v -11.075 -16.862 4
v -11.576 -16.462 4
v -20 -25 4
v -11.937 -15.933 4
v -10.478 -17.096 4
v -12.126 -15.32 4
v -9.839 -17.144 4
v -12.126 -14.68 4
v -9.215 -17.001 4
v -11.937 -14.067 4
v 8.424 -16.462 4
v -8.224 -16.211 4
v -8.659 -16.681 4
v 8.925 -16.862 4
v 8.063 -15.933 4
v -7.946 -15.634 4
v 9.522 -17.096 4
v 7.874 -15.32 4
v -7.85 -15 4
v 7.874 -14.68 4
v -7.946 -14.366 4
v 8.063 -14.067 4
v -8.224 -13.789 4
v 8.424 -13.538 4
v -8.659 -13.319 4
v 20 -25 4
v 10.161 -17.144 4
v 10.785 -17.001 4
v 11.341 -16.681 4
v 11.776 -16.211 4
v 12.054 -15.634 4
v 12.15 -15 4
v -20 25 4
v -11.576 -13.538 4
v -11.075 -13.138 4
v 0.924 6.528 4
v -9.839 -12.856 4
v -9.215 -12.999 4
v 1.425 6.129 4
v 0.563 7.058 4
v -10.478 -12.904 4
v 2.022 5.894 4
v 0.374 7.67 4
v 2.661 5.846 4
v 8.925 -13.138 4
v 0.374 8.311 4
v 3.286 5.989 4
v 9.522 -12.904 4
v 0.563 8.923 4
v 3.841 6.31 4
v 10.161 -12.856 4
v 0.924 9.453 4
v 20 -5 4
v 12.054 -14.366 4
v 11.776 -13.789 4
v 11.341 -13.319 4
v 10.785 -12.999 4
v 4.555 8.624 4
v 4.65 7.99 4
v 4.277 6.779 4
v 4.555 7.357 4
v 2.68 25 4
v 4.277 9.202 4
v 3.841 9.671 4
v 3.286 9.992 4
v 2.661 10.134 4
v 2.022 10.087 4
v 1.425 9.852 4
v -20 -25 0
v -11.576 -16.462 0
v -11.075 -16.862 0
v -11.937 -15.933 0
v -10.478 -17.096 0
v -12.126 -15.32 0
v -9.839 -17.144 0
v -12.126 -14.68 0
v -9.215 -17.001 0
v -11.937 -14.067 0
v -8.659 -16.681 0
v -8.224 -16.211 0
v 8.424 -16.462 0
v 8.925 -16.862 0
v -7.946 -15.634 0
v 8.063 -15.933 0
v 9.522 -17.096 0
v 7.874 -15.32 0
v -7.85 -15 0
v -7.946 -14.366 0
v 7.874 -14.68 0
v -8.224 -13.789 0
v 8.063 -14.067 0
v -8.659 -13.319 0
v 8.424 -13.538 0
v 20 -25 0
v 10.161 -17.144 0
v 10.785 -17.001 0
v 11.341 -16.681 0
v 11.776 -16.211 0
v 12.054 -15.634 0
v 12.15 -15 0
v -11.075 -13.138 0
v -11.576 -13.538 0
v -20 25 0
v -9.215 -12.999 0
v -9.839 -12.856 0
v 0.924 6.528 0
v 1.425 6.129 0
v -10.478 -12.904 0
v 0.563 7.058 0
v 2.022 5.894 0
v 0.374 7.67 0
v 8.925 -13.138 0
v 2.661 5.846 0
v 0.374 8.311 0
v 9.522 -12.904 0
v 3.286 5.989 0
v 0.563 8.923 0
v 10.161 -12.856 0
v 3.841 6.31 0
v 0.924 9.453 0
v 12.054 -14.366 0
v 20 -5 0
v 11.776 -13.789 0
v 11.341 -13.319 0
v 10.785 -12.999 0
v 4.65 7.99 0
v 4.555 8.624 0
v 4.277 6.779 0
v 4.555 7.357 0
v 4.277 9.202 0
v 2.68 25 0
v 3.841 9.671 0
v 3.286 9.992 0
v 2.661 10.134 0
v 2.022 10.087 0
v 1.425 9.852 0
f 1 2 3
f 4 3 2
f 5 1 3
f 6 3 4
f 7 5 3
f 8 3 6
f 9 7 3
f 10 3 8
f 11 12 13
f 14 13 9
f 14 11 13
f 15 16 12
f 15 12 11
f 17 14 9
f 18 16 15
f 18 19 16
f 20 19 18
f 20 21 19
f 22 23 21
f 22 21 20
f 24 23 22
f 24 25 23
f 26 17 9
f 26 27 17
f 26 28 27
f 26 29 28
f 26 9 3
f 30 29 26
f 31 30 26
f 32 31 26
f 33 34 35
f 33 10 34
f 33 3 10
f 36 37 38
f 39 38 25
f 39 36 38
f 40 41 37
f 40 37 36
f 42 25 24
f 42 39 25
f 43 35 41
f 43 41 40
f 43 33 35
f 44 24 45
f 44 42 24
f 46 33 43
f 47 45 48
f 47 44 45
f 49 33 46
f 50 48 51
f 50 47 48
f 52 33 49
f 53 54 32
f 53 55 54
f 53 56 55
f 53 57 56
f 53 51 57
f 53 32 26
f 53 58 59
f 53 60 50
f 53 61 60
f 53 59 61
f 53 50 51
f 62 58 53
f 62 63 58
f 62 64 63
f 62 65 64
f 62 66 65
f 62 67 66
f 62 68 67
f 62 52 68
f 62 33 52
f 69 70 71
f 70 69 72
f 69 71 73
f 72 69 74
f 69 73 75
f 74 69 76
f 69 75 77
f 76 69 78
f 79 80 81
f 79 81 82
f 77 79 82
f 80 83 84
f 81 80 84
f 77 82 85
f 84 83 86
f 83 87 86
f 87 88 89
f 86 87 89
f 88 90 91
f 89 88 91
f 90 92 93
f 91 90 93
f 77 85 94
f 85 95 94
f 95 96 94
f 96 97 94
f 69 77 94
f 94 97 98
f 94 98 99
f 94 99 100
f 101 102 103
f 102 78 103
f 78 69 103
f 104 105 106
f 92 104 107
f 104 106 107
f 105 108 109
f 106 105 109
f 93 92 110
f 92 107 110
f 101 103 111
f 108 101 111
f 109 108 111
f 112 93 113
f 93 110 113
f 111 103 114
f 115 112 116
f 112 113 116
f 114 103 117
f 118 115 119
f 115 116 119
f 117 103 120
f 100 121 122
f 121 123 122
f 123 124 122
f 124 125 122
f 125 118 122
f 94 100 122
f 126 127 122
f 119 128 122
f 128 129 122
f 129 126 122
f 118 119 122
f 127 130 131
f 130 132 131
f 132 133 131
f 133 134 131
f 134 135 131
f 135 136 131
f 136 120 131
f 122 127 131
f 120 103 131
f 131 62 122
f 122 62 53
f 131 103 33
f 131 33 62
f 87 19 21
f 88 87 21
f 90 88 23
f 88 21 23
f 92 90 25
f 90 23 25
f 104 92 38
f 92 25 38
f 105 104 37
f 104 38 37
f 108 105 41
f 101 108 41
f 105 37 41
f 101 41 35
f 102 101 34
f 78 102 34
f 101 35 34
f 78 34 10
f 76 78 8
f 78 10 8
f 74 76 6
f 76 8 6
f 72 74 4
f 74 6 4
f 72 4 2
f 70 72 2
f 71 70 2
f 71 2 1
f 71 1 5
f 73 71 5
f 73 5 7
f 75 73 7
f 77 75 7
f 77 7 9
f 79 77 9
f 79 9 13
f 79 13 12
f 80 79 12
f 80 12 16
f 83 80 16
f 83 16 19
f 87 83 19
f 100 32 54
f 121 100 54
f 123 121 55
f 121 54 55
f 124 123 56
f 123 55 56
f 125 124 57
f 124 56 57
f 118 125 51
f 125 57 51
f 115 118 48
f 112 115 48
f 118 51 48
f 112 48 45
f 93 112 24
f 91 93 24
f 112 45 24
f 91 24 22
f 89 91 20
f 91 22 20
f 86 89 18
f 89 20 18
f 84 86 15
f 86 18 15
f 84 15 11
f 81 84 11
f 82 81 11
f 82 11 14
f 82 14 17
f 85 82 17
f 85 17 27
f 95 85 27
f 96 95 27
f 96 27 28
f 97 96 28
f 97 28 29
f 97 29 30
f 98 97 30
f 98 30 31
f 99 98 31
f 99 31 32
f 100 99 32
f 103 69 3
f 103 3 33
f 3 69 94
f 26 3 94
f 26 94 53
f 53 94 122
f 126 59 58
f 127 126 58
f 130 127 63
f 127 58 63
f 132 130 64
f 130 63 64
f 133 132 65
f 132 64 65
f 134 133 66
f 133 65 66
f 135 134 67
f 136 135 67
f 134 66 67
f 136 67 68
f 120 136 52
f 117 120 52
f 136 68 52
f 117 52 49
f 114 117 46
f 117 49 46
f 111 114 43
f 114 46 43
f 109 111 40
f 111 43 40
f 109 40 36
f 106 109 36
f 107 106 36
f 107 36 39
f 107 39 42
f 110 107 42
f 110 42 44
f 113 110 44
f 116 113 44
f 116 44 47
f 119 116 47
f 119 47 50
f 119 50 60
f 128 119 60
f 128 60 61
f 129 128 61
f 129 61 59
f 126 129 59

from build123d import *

# Parameters (mm, degrees)
SKETCH1_W           = 40
SKETCH1_H           = 50
BOSS_EXTRUDE1_DEPTH = 4
CUT_EXTRUDE2_DEPTH  = 33.26453161
SKETCH4_R           = 2.15
CUT_EXTRUDE3_DEPTH  = 33.26453161
SKETCH5_R           = 2.15
CUT_EXTRUDE4_DEPTH  = 33.26453161
SKETCH8_R           = 2.15
CUT_EXTRUDE5_DEPTH  = 33.26453161


with BuildPart() as part:
    # Sketch1 → Boss-Extrude1 (new body)
    with BuildSketch(Plane.XY):
        Rectangle(SKETCH1_W, SKETCH1_H)
    extrude(amount=BOSS_EXTRUDE1_DEPTH)

    # Sketch3 → Cut-Extrude2 (cut, through all)
    with BuildSketch(Plane.XY.offset(4)):
        Polygon((2.68, 25), (20, -5), (20, 25), align=None)
    extrude(amount=-CUT_EXTRUDE2_DEPTH, mode=Mode.SUBTRACT)

    # Sketch4 → Cut-Extrude3 (cut, through all)
    with BuildSketch(Plane.XY.offset(4)):
        with Locations((2.500165004, 7.990476321)):
            Circle(SKETCH4_R)
    extrude(amount=-CUT_EXTRUDE3_DEPTH, mode=Mode.SUBTRACT)

    # Sketch5 → Cut-Extrude4 (cut, through all)
    with BuildSketch(Plane.XY.offset(4)):
        with Locations((-10, -15)):
            Circle(SKETCH5_R)
    extrude(amount=-CUT_EXTRUDE4_DEPTH, mode=Mode.SUBTRACT)

    # Sketch8 → Cut-Extrude5 (cut, through all)
    with BuildSketch(Plane.XY.offset(4)):
        with Locations((10, -15)):
            Circle(SKETCH8_R)
    extrude(amount=-CUT_EXTRUDE5_DEPTH, mode=Mode.SUBTRACT)


solid = part.part
